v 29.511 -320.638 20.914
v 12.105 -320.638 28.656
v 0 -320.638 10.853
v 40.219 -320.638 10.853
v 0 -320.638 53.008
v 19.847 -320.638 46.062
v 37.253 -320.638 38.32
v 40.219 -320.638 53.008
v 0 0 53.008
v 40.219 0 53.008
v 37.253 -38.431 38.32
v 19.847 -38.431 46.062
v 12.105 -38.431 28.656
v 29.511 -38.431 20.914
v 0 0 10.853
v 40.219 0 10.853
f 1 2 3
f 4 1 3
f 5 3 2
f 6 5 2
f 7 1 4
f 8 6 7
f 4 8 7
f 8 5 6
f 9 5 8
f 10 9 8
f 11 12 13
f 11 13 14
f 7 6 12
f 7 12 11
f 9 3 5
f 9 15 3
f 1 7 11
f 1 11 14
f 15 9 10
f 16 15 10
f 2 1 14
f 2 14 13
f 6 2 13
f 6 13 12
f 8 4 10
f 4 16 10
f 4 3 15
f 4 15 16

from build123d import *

# Parameters (mm, degrees)
F0_W     = 40.219121
F0_H     = 42.154662
F1_DEPTH = 38.431481
F3_W     = 40.219121
F3_H     = 42.154662
F4_DEPTH = 282.206297


with BuildPart() as f1:
    # F0 (on Front) → F1 (new body)
    with BuildSketch(Plane.XZ):
        with Locations((20.109561, 31.930771)):
            Rectangle(F0_W, F0_H)
    extrude(amount=F1_DEPTH)

    # F3 (on face) → F4 (join)
    with BuildSketch(Plane.XZ.offset(38.431481)):
        with Locations((20.109561, 31.930771)):
            Rectangle(F3_W, F3_H)
        Polygon((37.252998, 38.319705), (29.511055, 20.913811), (12.105161, 28.655754), (19.847104, 46.061648), align=None, mode=Mode.SUBTRACT)
    extrude(amount=F4_DEPTH)


solid = f1.part
